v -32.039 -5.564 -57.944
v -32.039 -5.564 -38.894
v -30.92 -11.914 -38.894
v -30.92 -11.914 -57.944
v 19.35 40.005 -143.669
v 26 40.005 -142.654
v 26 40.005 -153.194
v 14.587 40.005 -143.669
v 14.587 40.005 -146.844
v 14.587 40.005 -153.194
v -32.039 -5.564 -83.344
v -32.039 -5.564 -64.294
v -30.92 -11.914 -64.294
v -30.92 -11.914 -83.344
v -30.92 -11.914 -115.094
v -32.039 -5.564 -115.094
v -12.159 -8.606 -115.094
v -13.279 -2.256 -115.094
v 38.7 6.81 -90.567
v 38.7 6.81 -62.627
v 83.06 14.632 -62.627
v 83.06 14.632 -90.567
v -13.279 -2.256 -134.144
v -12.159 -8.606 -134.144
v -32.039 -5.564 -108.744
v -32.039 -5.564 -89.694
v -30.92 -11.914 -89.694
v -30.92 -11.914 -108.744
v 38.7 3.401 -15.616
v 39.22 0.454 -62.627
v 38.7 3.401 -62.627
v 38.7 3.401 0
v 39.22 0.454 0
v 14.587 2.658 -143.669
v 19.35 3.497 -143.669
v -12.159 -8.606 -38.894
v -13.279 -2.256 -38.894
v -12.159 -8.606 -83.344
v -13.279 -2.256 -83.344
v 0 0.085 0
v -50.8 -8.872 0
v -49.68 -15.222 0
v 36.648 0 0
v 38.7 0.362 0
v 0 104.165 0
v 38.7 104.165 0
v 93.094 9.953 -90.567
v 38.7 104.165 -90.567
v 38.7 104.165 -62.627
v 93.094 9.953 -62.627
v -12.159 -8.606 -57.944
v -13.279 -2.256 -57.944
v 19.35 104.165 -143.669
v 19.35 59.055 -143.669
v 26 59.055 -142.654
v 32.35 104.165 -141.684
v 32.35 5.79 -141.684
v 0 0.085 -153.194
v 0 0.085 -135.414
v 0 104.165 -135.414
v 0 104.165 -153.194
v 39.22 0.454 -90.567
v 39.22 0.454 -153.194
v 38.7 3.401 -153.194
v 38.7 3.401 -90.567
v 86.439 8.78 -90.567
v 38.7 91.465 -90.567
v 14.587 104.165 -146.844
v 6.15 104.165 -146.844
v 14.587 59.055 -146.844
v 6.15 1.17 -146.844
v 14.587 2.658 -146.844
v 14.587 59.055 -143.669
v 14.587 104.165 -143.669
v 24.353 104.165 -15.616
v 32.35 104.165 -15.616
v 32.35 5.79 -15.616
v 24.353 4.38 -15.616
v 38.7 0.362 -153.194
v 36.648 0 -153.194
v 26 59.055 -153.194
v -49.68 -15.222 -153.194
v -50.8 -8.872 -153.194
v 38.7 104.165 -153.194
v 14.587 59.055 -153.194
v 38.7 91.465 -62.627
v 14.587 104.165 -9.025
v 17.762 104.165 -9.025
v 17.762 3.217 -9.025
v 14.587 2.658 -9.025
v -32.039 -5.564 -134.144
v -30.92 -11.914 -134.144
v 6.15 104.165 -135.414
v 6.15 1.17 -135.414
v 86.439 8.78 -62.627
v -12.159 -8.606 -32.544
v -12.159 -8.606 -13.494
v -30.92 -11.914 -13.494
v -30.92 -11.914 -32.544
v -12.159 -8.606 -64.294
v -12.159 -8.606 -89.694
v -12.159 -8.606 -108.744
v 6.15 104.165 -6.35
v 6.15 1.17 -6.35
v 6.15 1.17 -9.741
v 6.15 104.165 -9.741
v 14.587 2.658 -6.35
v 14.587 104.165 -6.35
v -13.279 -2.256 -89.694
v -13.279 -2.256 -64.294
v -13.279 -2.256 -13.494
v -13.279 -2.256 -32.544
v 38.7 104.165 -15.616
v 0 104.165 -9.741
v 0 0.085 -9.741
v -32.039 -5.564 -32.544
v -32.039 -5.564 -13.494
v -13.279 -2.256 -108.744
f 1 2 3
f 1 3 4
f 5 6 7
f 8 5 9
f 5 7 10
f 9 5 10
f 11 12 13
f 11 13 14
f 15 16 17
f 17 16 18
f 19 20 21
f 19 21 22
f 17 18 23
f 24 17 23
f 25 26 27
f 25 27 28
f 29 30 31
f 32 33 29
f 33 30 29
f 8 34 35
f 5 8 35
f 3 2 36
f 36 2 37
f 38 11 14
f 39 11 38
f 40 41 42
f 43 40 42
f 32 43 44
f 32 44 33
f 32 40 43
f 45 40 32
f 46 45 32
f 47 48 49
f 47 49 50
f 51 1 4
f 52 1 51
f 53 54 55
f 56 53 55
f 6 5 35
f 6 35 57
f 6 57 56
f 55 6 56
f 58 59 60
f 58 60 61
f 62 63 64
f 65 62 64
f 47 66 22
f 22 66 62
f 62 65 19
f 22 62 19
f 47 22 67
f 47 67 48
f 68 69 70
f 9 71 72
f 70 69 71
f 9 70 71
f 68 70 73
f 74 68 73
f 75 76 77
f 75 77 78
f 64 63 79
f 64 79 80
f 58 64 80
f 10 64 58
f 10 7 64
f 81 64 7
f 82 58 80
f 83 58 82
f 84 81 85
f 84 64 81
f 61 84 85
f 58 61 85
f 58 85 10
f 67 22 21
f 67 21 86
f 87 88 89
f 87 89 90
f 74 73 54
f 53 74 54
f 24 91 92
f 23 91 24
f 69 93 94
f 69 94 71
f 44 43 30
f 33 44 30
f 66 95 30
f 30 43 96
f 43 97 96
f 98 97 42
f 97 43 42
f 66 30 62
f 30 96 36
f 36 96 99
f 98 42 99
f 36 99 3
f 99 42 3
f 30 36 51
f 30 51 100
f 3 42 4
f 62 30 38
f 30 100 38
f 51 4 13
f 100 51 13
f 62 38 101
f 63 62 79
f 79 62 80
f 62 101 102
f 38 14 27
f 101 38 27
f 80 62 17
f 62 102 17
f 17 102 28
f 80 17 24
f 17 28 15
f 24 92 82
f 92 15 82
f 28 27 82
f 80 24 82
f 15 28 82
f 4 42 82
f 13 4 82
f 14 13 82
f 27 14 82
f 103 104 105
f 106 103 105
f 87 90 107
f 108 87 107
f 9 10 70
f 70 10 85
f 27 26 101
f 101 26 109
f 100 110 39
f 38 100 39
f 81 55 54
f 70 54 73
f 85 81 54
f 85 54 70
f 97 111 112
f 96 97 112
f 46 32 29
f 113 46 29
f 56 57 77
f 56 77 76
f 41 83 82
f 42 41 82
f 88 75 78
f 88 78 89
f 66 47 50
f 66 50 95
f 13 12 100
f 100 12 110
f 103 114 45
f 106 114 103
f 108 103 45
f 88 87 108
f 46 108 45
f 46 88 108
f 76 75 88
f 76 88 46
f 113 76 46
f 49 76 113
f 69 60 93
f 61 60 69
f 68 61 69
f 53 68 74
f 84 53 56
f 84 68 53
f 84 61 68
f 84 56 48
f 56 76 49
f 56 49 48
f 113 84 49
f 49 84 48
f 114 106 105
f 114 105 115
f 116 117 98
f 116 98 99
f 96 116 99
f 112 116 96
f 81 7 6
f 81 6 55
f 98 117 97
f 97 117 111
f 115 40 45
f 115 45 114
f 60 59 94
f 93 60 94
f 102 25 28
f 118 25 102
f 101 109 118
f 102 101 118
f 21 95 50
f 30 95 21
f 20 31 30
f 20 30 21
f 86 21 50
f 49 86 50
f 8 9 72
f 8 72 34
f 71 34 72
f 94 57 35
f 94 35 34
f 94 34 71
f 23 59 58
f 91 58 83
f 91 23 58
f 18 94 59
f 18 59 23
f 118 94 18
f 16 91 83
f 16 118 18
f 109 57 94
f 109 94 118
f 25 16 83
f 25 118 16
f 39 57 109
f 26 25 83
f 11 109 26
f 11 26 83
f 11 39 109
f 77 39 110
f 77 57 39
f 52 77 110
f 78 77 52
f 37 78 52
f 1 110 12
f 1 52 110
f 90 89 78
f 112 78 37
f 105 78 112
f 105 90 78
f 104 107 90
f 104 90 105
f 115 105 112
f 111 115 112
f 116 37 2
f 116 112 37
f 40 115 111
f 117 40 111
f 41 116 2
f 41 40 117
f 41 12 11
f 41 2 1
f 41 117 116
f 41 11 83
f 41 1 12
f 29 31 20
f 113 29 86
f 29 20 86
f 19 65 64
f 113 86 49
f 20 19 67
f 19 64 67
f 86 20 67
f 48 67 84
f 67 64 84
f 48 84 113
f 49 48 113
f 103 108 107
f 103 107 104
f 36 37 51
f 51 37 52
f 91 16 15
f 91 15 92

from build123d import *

# Parameters (mm, degrees)
SKETCH1_W           = 38.699948
SKETCH1_H           = 153.19375
BOSS_EXTRUDE1_DEPTH = 0.0254
BOSS_EXTRUDE2_DEPTH = 104.14
SKETCH6_W           = 6.35
SKETCH6_H           = 104.14
BOSS_EXTRUDE3_DEPTH = 119.798010362
BOSS_EXTRUDE7_REACH = 191.252
BOSS_EXTRUDE5_START = -62.626875
BOSS_EXTRUDE5_DEPTH = 27.94
CUT_EXTRUDE1_REACH  = 209.329
SKETCH14_W          = 11.4125
SKETCH14_H          = 19.05
BOSS_EXTRUDE8_REACH = 204.162
SKETCH18_W          = 27.94
SKETCH18_H          = 6.35
SKETCH19_W          = 19.05
SKETCH19_H          = 19.05
CUT_EXTRUDE2_DEPTH  = 208.293560784
SKETCH20_W          = 135.918968774
SKETCH20_H          = 500.058977118
CUT_EXTRUDE3_DEPTH  = 153.162


with BuildPart() as part:
    # Sketch1 → Boss-Extrude1 (new body)
    with BuildSketch(Plane(origin=(0, 0, 0), x_dir=(1, 0, 0), z_dir=(0, 1, 0))):
        with Locations((19.349974, 76.596875)):
            Rectangle(SKETCH1_W, SKETCH1_H)
    extrude(amount=BOSS_EXTRUDE1_DEPTH)

    # Sketch3 → Boss-Extrude2 (add)
    with BuildSketch(Plane(origin=(0, 0.0254, 0), x_dir=(1, 0, 0), z_dir=(0, 1, 0))):
        Polygon((6.15, 146.84375), (14.587499908, 146.84375), (14.587499908, 143.66875), (19.349999908, 143.66875), (32.349999908, 141.684375), (32.349999908, 135.41375), (38.699999908, 135.41375), (38.699999908, 153.19375), (0, 153.19375), (0, 135.41375), (6.15, 135.41375), align=None)
        Polygon((17.762499908, 9.025), (14.587499908, 9.025), (14.587499908, 6.35), (6.15, 6.35), (6.15, 9.74074125), (0, 9.74074125), (0, 0), (38.699921546, 0), (38.699921546, 15.615739638), (24.353239546, 15.615739638), align=None)
    extrude(amount=BOSS_EXTRUDE2_DEPTH)

    # Sketch6 → Boss-Extrude3 (add)
    with BuildSketch(Plane.XY.offset(-135.41375)):
        with Locations((35.524999908, 52.0954)):
            Rectangle(SKETCH6_W, SKETCH6_H)
    extrude(amount=BOSS_EXTRUDE3_DEPTH)

    # Boss-Extrude7: up to this face of the body (flat: up to its plane)
    boss_extrude7_end = Plane(part.part.faces().sort_by_distance((19.349999948, 52.082700017, -153.19375))[0])
    # Sketch15 → Boss-Extrude7 (add, up to the picked face)
    with BuildSketch(Plane.XY, mode=Mode.PRIVATE) as boss_extrude7_sk1:
        Polygon((-50.8, -8.87193717), (-49.680323673, -15.22193717), (39.219676327, 0.453531415), (38.1, 6.803531415), align=None)
    boss_extrude7_tool1 = split(extrude(boss_extrude7_sk1.sketch, amount=-BOSS_EXTRUDE7_REACH, mode=Mode.PRIVATE), bisect_by=boss_extrude7_end, keep=Keep.BOTH, mode=Mode.PRIVATE)
    add(boss_extrude7_tool1.solids().sort_by(Axis((-5.790162, -4.209203, 0), (0, 0, -1)))[0])

    # Sketch11 → Boss-Extrude5 (add)
    with BuildSketch(Plane(origin=(0, 0, -153.19375), x_dir=(-1, 0, 0), z_dir=(0, 0, -1)).offset(BOSS_EXTRUDE5_START)):
        Polygon((-38.699948, 104.1654), (-93.093533667, 9.952946019), (-86.438666859, 8.779513448), (-38.699948, 91.4654), align=None)
    extrude(amount=-BOSS_EXTRUDE5_DEPTH)

    # Sketch14 → Cut-Extrude1 (cut, up to next)
    with BuildSketch(Plane(origin=(0, 0, -153.19375), x_dir=(-1, 0, 0), z_dir=(0, 0, -1)), mode=Mode.PRIVATE) as cut_extrude1_sk1:
        with Locations((-20.293749908, 49.53)):
            Rectangle(SKETCH14_W, SKETCH14_H)
    cut_extrude1_tool1 = extrude(cut_extrude1_sk1.sketch, amount=-CUT_EXTRUDE1_REACH, mode=Mode.PRIVATE) & part.part
    add(cut_extrude1_tool1.solids().sort_by_distance((20.29375, 49.53, -153.19375))[0], mode=Mode.SUBTRACT)

    # Boss-Extrude8: up to this plane
    boss_extrude8_end = Plane(origin=(38.699948, 91.4654, -62.626875), z_dir=(0.8660254037844379, 0.5000000000000011, 0))
    # Sketch18 → Boss-Extrude8 (add, up to the surface)
    with BuildSketch(Plane(origin=(38.114616821, 6.720635305, 0), x_dir=(0, 0, -1), z_dir=(0.9848077530122079, 0.17364817766693177, 0)), mode=Mode.PRIVATE) as boss_extrude8_sk1:
        with Locations((76.596875, -3.188784069)):
            Rectangle(SKETCH18_W, SKETCH18_H)
    boss_extrude8_tool1 = split(extrude(boss_extrude8_sk1.sketch, amount=BOSS_EXTRUDE8_REACH, mode=Mode.PRIVATE), bisect_by=boss_extrude8_end, keep=Keep.BOTH, mode=Mode.PRIVATE)
    add(boss_extrude8_tool1.solids().sort_by_distance((38.668343, 3.580296, -76.596875))[0])

    # Sketch19 → Cut-Extrude2 (cut, through all)
    with BuildSketch(Plane(origin=(-0.014616821, 0.08289611, 0), x_dir=(0.984807753012208, 0.1736481776669311, 0), z_dir=(-0.1736481776669311, 0.984807753012208, 0))):
        with Locations((-22.993829575, 124.61875)):
            Rectangle(SKETCH19_W, SKETCH19_H)
        with Locations((-22.993829575, 99.21875)):
            Rectangle(SKETCH19_W, SKETCH19_H)
        with Locations((-22.993829575, 73.81875)):
            Rectangle(SKETCH19_W, SKETCH19_H)
        with Locations((-22.993829575, 48.41875)):
            Rectangle(SKETCH19_W, SKETCH19_H)
        with Locations((-22.993829575, 23.01875)):
            Rectangle(SKETCH19_W, SKETCH19_H)
    extrude(amount=-CUT_EXTRUDE2_DEPTH, mode=Mode.SUBTRACT)

    # Sketch20 → Cut-Extrude3 (cut)
    with BuildSketch(Plane(origin=(1.105059507, -6.26710389, 0), x_dir=(0.9848077530122079, 0.17364817766693127, 0), z_dir=(0.17364817766693127, -0.9848077530122079, 0))):
        with Locations((20.082569743, -64.610703306)):
            Rectangle(SKETCH20_W, SKETCH20_H)
    extrude(amount=CUT_EXTRUDE3_DEPTH, mode=Mode.SUBTRACT)


solid = part.part
